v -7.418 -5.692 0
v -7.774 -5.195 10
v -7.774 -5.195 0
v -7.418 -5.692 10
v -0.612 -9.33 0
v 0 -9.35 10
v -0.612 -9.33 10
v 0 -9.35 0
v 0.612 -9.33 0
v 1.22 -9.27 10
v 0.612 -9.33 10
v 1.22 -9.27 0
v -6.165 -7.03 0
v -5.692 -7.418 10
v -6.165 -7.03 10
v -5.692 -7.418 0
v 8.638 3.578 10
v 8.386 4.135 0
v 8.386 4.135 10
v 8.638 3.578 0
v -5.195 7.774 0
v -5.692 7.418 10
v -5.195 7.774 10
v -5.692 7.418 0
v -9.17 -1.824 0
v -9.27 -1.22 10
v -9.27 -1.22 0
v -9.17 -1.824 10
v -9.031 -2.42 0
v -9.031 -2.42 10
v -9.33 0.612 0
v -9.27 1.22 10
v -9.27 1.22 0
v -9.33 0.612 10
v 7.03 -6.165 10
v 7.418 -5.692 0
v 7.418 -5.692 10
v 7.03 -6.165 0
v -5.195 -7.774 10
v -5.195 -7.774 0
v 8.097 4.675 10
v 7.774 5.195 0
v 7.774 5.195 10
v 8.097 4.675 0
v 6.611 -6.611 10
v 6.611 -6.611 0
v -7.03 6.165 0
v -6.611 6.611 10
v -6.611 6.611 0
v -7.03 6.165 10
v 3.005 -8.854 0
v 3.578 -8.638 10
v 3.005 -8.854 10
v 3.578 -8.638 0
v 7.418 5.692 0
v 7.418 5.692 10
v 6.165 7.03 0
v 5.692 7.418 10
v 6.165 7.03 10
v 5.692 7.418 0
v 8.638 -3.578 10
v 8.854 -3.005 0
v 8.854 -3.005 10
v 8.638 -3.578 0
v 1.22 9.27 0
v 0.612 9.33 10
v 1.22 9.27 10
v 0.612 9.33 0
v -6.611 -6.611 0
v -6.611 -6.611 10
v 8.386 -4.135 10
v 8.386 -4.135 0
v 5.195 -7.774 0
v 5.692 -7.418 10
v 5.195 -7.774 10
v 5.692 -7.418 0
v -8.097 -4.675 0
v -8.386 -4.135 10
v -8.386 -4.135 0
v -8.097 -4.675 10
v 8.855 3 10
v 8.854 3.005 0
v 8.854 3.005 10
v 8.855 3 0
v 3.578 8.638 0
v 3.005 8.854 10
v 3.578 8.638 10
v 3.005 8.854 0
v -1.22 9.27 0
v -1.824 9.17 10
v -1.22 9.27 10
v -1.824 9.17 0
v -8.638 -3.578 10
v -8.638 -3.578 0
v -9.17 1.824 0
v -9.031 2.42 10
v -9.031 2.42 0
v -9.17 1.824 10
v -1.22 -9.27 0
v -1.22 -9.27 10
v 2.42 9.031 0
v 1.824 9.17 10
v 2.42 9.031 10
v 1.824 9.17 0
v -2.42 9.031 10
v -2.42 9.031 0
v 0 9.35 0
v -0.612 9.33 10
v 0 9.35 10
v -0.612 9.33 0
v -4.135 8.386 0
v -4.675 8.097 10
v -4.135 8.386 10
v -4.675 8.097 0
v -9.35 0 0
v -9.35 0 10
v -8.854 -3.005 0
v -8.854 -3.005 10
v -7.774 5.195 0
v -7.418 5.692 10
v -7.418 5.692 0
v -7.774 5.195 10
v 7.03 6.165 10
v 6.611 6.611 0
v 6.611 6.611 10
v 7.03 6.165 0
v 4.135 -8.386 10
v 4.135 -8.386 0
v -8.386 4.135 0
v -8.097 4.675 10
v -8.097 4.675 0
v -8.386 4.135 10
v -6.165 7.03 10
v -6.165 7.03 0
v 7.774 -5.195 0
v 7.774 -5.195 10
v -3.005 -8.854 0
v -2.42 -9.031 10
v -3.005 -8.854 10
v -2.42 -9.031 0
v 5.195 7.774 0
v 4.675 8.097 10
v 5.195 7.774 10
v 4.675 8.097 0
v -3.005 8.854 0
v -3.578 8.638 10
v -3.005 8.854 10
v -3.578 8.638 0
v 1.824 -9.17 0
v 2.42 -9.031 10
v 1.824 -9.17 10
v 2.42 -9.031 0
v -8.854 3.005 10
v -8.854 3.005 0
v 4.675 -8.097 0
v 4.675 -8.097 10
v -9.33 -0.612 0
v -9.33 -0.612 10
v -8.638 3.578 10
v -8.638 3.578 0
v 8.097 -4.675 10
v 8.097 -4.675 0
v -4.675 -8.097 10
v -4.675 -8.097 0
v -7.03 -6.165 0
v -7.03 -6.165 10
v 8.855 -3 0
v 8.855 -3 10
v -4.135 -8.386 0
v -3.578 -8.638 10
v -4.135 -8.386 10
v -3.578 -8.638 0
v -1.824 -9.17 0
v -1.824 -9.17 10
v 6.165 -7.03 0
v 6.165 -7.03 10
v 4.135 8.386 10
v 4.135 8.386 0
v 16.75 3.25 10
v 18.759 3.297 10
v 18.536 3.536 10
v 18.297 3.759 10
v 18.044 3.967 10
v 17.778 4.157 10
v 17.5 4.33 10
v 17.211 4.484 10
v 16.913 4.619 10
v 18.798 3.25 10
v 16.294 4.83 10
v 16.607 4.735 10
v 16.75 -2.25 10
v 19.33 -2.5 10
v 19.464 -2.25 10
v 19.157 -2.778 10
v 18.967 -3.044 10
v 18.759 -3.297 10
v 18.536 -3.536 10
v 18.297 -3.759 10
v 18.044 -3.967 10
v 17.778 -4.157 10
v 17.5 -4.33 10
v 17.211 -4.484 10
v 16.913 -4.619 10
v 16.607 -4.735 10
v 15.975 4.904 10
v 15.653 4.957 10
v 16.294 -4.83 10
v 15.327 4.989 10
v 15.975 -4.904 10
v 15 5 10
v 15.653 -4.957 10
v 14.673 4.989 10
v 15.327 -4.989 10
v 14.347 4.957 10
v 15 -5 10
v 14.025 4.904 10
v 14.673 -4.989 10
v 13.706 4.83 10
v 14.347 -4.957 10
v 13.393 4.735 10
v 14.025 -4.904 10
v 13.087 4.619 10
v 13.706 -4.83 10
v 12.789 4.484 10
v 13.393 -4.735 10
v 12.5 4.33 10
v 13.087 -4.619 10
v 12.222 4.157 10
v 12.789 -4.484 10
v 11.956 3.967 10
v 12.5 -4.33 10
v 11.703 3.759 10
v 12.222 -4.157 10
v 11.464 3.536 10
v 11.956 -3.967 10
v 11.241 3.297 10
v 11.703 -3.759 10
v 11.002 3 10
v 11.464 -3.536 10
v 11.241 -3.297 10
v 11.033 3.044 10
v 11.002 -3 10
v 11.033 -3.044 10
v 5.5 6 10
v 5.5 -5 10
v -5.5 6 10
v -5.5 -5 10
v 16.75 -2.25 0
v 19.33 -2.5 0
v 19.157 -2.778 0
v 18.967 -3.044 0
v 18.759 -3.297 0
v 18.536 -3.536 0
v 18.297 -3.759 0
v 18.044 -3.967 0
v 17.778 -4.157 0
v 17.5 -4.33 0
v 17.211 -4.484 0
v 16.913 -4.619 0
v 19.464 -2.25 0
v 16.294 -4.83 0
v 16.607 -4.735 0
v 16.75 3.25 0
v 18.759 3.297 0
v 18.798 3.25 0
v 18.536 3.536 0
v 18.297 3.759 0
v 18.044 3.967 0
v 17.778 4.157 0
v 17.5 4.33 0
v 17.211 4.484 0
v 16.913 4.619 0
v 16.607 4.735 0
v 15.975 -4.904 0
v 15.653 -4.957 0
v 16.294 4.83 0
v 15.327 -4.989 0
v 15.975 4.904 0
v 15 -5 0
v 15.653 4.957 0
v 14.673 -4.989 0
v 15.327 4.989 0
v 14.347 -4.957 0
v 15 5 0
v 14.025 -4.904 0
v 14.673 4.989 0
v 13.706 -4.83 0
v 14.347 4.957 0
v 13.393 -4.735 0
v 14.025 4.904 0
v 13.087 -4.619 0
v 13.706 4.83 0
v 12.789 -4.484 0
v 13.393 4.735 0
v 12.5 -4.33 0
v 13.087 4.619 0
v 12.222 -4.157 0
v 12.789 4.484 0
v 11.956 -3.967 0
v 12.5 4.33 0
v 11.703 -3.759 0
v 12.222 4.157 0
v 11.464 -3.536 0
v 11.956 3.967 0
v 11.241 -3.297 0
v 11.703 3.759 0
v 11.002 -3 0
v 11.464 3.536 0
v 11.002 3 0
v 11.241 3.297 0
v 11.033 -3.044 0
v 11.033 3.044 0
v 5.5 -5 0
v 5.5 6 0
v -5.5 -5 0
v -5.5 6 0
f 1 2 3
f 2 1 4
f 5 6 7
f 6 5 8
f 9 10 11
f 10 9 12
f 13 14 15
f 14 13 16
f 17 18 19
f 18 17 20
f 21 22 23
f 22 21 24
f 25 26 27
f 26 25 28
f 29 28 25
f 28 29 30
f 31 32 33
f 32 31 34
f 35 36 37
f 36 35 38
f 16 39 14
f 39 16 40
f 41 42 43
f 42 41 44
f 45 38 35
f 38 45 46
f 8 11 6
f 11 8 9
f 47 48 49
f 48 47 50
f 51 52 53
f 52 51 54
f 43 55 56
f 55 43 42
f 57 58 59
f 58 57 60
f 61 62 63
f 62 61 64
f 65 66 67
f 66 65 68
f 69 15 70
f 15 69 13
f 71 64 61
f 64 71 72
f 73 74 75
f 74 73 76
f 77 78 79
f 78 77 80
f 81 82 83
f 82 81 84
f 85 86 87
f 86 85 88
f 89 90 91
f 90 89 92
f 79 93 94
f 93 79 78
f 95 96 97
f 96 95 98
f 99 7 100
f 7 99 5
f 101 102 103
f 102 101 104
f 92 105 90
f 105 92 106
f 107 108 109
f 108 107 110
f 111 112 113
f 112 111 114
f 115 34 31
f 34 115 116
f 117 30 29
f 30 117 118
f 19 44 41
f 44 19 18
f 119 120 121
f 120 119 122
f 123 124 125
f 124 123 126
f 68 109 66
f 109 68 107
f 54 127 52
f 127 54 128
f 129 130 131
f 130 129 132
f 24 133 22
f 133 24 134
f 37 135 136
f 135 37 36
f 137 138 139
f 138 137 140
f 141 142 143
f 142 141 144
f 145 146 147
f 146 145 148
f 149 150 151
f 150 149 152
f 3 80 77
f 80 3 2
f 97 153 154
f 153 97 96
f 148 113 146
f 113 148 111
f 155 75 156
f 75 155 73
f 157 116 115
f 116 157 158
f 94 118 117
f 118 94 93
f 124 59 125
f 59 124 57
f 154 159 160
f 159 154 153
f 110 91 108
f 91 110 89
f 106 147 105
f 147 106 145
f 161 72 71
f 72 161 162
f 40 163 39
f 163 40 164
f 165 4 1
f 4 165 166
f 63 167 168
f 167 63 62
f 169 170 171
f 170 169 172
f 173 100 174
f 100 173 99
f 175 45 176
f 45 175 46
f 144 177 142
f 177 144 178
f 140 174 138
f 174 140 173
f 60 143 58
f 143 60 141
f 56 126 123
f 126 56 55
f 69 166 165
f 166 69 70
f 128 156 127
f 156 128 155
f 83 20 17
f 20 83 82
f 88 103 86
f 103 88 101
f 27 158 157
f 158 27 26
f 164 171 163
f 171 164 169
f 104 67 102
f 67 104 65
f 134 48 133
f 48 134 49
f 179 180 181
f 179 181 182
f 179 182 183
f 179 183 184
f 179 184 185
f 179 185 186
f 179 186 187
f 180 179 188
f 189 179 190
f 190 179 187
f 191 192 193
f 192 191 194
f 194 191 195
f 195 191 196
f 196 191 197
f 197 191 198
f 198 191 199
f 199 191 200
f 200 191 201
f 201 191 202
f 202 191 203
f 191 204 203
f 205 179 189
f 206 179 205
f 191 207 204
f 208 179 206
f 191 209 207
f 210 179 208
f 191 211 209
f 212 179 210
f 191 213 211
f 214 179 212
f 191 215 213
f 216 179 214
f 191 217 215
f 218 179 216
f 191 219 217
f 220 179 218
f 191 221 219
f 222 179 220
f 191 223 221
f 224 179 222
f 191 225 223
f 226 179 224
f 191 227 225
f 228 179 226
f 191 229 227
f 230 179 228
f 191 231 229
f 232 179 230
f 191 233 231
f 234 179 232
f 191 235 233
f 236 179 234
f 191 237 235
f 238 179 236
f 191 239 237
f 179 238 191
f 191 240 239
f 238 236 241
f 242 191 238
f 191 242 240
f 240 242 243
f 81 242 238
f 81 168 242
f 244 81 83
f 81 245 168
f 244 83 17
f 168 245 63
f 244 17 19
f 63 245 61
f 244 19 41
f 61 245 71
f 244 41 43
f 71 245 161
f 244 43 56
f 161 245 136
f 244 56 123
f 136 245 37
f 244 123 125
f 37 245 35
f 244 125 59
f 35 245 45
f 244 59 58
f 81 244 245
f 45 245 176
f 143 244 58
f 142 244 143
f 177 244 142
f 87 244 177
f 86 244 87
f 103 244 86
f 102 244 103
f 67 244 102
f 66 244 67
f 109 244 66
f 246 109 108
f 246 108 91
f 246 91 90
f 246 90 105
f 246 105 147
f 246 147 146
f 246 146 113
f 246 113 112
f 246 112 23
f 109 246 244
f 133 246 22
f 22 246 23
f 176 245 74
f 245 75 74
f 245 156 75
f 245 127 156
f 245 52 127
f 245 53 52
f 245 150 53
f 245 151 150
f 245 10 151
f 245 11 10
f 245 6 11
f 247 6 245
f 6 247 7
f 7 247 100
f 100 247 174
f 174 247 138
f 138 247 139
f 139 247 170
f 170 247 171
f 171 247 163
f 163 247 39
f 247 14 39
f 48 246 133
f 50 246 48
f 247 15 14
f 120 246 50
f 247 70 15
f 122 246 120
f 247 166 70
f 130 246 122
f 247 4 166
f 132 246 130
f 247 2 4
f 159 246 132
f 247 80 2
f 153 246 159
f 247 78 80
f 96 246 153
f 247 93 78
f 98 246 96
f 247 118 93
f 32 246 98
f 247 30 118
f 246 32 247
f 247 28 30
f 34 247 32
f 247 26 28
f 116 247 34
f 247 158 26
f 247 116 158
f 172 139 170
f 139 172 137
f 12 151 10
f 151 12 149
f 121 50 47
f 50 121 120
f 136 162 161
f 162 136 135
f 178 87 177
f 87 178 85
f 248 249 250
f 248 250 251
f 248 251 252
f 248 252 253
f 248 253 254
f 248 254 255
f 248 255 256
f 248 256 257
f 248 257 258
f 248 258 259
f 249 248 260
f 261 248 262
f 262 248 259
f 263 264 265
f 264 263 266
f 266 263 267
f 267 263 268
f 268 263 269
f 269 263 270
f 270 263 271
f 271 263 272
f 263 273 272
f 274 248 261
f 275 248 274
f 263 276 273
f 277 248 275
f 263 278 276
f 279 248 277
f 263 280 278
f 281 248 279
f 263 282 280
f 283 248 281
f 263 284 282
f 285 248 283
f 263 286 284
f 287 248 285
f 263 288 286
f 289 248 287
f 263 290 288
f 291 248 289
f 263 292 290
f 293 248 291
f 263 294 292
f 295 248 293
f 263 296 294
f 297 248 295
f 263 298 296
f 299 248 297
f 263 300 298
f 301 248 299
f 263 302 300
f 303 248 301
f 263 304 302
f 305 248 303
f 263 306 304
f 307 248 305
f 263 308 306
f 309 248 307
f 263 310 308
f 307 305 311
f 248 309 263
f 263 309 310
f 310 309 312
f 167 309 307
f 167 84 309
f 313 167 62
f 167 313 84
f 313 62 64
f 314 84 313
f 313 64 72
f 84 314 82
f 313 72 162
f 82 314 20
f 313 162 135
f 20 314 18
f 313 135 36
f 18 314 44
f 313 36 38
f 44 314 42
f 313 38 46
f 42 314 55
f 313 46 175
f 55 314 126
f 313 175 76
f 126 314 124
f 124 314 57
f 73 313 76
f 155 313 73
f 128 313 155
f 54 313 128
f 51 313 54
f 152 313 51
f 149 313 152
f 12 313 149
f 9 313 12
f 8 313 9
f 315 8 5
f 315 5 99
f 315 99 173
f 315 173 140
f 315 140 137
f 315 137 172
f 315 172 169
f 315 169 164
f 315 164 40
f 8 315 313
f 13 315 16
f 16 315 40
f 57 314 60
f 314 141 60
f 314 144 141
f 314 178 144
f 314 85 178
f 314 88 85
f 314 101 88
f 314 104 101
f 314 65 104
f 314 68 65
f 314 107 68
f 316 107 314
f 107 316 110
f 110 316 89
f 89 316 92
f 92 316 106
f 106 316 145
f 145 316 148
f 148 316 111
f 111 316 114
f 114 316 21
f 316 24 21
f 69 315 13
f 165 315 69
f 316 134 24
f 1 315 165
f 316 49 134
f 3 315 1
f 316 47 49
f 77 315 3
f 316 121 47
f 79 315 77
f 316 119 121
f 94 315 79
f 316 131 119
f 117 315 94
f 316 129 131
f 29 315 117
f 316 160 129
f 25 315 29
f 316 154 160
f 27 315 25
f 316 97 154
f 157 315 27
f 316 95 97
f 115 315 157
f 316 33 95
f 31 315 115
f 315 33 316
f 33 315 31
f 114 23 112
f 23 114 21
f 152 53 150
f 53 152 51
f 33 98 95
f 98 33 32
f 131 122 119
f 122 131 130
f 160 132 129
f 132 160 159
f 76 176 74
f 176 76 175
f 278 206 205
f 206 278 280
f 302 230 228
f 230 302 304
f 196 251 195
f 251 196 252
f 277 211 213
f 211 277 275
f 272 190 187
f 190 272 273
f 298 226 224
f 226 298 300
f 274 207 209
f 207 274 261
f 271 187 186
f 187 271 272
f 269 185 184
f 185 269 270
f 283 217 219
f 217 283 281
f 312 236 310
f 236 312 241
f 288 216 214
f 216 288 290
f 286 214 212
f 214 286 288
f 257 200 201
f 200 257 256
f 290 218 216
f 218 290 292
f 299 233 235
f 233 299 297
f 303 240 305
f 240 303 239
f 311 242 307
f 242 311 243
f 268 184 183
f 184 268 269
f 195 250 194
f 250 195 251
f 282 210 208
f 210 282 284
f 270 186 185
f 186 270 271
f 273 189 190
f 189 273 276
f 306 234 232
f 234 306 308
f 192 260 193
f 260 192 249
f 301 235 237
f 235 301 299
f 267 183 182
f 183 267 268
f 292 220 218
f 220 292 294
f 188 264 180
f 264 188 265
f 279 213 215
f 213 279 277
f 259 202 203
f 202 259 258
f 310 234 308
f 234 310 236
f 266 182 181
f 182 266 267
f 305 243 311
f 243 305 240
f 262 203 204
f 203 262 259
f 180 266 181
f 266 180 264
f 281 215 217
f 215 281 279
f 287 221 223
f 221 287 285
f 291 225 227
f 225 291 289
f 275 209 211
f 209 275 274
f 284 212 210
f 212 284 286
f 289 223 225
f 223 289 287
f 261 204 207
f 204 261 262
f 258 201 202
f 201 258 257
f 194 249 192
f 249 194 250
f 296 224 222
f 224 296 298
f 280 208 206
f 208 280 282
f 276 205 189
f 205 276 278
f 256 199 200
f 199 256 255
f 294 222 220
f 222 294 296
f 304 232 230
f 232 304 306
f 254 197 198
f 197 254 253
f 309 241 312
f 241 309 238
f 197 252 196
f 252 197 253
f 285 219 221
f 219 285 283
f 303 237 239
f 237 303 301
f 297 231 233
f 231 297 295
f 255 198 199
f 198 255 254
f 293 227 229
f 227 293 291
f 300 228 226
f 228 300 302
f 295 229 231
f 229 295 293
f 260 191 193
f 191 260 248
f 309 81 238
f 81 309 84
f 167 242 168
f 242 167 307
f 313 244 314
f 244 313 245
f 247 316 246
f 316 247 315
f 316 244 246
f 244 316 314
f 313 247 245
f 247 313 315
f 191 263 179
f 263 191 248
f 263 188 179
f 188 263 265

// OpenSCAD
// Snap-on tubing clip for a 12.7 mm lab stand rod
// Print orientation: flat on bed, extrusion along +Z

$fn = 96;

// ---- Rod ring ----
rod_id   = 12.7;   // rod inner diameter
rod_wall = 3;      // ring wall thickness
rod_od   = rod_id + 2 * rod_wall;  // 18.7 mm outer diameter
rod_open = 10;     // width of opening cut from -X side

// ---- Tubing ring ----
tube_id  = 6;      // tubing inner diameter
tube_wall = 2;     // ring wall thickness
tube_od  = tube_id + 2 * tube_wall;  // 10 mm outer diameter
tube_x   = 15;     // ring centre X
tube_open = 4.5;   // width of opening cut from +X side

// ---- Bridge ----
bridge_w = 6;      // bridge width along Y
bridge_x0 = 8;     // bridge start X
bridge_x1 = 12;    // bridge end X

// ---- Cut clearance ----
eps = 0.5;         // overshoot for clean boolean cuts

difference() {
    union() {
        // Rod ring
        cylinder(d = rod_od, h = 10);
        translate([-rod_open / 2, -rod_open / 2, 0])
            cube([rod_open, rod_open, 10]);

        // Tubing ring
        translate([tube_x, 0, 0])
            cylinder(d = tube_od, h = 10);
        translate([tube_x + tube_open / 2, -tube_open / 2, 0])
            cube([tube_open, tube_open, 10]);

        // Solid bridge
        translate([bridge_x0, -bridge_w / 2, 0])
            cube([bridge_x1 - bridge_x0, bridge_w, 10]);
    }

    // Cut out the stand rod opening (x < 0, -5 < y < 5)
    translate([-rod_open / 2 - eps, -rod_open / 2, -eps])
        cube([rod_open + 2 * eps, rod_open + 2 * eps, 10 + 2 * eps]);

    // Cut out the tubing opening (x > 15, -2.25 < y < 2.25)
    translate([tube_x + tube_open / 2 - eps, -tube_open / 2, -eps])
        cube([tube_open + 2 * eps, tube_open + 2 * eps, 10 + 2 * eps]);
}
